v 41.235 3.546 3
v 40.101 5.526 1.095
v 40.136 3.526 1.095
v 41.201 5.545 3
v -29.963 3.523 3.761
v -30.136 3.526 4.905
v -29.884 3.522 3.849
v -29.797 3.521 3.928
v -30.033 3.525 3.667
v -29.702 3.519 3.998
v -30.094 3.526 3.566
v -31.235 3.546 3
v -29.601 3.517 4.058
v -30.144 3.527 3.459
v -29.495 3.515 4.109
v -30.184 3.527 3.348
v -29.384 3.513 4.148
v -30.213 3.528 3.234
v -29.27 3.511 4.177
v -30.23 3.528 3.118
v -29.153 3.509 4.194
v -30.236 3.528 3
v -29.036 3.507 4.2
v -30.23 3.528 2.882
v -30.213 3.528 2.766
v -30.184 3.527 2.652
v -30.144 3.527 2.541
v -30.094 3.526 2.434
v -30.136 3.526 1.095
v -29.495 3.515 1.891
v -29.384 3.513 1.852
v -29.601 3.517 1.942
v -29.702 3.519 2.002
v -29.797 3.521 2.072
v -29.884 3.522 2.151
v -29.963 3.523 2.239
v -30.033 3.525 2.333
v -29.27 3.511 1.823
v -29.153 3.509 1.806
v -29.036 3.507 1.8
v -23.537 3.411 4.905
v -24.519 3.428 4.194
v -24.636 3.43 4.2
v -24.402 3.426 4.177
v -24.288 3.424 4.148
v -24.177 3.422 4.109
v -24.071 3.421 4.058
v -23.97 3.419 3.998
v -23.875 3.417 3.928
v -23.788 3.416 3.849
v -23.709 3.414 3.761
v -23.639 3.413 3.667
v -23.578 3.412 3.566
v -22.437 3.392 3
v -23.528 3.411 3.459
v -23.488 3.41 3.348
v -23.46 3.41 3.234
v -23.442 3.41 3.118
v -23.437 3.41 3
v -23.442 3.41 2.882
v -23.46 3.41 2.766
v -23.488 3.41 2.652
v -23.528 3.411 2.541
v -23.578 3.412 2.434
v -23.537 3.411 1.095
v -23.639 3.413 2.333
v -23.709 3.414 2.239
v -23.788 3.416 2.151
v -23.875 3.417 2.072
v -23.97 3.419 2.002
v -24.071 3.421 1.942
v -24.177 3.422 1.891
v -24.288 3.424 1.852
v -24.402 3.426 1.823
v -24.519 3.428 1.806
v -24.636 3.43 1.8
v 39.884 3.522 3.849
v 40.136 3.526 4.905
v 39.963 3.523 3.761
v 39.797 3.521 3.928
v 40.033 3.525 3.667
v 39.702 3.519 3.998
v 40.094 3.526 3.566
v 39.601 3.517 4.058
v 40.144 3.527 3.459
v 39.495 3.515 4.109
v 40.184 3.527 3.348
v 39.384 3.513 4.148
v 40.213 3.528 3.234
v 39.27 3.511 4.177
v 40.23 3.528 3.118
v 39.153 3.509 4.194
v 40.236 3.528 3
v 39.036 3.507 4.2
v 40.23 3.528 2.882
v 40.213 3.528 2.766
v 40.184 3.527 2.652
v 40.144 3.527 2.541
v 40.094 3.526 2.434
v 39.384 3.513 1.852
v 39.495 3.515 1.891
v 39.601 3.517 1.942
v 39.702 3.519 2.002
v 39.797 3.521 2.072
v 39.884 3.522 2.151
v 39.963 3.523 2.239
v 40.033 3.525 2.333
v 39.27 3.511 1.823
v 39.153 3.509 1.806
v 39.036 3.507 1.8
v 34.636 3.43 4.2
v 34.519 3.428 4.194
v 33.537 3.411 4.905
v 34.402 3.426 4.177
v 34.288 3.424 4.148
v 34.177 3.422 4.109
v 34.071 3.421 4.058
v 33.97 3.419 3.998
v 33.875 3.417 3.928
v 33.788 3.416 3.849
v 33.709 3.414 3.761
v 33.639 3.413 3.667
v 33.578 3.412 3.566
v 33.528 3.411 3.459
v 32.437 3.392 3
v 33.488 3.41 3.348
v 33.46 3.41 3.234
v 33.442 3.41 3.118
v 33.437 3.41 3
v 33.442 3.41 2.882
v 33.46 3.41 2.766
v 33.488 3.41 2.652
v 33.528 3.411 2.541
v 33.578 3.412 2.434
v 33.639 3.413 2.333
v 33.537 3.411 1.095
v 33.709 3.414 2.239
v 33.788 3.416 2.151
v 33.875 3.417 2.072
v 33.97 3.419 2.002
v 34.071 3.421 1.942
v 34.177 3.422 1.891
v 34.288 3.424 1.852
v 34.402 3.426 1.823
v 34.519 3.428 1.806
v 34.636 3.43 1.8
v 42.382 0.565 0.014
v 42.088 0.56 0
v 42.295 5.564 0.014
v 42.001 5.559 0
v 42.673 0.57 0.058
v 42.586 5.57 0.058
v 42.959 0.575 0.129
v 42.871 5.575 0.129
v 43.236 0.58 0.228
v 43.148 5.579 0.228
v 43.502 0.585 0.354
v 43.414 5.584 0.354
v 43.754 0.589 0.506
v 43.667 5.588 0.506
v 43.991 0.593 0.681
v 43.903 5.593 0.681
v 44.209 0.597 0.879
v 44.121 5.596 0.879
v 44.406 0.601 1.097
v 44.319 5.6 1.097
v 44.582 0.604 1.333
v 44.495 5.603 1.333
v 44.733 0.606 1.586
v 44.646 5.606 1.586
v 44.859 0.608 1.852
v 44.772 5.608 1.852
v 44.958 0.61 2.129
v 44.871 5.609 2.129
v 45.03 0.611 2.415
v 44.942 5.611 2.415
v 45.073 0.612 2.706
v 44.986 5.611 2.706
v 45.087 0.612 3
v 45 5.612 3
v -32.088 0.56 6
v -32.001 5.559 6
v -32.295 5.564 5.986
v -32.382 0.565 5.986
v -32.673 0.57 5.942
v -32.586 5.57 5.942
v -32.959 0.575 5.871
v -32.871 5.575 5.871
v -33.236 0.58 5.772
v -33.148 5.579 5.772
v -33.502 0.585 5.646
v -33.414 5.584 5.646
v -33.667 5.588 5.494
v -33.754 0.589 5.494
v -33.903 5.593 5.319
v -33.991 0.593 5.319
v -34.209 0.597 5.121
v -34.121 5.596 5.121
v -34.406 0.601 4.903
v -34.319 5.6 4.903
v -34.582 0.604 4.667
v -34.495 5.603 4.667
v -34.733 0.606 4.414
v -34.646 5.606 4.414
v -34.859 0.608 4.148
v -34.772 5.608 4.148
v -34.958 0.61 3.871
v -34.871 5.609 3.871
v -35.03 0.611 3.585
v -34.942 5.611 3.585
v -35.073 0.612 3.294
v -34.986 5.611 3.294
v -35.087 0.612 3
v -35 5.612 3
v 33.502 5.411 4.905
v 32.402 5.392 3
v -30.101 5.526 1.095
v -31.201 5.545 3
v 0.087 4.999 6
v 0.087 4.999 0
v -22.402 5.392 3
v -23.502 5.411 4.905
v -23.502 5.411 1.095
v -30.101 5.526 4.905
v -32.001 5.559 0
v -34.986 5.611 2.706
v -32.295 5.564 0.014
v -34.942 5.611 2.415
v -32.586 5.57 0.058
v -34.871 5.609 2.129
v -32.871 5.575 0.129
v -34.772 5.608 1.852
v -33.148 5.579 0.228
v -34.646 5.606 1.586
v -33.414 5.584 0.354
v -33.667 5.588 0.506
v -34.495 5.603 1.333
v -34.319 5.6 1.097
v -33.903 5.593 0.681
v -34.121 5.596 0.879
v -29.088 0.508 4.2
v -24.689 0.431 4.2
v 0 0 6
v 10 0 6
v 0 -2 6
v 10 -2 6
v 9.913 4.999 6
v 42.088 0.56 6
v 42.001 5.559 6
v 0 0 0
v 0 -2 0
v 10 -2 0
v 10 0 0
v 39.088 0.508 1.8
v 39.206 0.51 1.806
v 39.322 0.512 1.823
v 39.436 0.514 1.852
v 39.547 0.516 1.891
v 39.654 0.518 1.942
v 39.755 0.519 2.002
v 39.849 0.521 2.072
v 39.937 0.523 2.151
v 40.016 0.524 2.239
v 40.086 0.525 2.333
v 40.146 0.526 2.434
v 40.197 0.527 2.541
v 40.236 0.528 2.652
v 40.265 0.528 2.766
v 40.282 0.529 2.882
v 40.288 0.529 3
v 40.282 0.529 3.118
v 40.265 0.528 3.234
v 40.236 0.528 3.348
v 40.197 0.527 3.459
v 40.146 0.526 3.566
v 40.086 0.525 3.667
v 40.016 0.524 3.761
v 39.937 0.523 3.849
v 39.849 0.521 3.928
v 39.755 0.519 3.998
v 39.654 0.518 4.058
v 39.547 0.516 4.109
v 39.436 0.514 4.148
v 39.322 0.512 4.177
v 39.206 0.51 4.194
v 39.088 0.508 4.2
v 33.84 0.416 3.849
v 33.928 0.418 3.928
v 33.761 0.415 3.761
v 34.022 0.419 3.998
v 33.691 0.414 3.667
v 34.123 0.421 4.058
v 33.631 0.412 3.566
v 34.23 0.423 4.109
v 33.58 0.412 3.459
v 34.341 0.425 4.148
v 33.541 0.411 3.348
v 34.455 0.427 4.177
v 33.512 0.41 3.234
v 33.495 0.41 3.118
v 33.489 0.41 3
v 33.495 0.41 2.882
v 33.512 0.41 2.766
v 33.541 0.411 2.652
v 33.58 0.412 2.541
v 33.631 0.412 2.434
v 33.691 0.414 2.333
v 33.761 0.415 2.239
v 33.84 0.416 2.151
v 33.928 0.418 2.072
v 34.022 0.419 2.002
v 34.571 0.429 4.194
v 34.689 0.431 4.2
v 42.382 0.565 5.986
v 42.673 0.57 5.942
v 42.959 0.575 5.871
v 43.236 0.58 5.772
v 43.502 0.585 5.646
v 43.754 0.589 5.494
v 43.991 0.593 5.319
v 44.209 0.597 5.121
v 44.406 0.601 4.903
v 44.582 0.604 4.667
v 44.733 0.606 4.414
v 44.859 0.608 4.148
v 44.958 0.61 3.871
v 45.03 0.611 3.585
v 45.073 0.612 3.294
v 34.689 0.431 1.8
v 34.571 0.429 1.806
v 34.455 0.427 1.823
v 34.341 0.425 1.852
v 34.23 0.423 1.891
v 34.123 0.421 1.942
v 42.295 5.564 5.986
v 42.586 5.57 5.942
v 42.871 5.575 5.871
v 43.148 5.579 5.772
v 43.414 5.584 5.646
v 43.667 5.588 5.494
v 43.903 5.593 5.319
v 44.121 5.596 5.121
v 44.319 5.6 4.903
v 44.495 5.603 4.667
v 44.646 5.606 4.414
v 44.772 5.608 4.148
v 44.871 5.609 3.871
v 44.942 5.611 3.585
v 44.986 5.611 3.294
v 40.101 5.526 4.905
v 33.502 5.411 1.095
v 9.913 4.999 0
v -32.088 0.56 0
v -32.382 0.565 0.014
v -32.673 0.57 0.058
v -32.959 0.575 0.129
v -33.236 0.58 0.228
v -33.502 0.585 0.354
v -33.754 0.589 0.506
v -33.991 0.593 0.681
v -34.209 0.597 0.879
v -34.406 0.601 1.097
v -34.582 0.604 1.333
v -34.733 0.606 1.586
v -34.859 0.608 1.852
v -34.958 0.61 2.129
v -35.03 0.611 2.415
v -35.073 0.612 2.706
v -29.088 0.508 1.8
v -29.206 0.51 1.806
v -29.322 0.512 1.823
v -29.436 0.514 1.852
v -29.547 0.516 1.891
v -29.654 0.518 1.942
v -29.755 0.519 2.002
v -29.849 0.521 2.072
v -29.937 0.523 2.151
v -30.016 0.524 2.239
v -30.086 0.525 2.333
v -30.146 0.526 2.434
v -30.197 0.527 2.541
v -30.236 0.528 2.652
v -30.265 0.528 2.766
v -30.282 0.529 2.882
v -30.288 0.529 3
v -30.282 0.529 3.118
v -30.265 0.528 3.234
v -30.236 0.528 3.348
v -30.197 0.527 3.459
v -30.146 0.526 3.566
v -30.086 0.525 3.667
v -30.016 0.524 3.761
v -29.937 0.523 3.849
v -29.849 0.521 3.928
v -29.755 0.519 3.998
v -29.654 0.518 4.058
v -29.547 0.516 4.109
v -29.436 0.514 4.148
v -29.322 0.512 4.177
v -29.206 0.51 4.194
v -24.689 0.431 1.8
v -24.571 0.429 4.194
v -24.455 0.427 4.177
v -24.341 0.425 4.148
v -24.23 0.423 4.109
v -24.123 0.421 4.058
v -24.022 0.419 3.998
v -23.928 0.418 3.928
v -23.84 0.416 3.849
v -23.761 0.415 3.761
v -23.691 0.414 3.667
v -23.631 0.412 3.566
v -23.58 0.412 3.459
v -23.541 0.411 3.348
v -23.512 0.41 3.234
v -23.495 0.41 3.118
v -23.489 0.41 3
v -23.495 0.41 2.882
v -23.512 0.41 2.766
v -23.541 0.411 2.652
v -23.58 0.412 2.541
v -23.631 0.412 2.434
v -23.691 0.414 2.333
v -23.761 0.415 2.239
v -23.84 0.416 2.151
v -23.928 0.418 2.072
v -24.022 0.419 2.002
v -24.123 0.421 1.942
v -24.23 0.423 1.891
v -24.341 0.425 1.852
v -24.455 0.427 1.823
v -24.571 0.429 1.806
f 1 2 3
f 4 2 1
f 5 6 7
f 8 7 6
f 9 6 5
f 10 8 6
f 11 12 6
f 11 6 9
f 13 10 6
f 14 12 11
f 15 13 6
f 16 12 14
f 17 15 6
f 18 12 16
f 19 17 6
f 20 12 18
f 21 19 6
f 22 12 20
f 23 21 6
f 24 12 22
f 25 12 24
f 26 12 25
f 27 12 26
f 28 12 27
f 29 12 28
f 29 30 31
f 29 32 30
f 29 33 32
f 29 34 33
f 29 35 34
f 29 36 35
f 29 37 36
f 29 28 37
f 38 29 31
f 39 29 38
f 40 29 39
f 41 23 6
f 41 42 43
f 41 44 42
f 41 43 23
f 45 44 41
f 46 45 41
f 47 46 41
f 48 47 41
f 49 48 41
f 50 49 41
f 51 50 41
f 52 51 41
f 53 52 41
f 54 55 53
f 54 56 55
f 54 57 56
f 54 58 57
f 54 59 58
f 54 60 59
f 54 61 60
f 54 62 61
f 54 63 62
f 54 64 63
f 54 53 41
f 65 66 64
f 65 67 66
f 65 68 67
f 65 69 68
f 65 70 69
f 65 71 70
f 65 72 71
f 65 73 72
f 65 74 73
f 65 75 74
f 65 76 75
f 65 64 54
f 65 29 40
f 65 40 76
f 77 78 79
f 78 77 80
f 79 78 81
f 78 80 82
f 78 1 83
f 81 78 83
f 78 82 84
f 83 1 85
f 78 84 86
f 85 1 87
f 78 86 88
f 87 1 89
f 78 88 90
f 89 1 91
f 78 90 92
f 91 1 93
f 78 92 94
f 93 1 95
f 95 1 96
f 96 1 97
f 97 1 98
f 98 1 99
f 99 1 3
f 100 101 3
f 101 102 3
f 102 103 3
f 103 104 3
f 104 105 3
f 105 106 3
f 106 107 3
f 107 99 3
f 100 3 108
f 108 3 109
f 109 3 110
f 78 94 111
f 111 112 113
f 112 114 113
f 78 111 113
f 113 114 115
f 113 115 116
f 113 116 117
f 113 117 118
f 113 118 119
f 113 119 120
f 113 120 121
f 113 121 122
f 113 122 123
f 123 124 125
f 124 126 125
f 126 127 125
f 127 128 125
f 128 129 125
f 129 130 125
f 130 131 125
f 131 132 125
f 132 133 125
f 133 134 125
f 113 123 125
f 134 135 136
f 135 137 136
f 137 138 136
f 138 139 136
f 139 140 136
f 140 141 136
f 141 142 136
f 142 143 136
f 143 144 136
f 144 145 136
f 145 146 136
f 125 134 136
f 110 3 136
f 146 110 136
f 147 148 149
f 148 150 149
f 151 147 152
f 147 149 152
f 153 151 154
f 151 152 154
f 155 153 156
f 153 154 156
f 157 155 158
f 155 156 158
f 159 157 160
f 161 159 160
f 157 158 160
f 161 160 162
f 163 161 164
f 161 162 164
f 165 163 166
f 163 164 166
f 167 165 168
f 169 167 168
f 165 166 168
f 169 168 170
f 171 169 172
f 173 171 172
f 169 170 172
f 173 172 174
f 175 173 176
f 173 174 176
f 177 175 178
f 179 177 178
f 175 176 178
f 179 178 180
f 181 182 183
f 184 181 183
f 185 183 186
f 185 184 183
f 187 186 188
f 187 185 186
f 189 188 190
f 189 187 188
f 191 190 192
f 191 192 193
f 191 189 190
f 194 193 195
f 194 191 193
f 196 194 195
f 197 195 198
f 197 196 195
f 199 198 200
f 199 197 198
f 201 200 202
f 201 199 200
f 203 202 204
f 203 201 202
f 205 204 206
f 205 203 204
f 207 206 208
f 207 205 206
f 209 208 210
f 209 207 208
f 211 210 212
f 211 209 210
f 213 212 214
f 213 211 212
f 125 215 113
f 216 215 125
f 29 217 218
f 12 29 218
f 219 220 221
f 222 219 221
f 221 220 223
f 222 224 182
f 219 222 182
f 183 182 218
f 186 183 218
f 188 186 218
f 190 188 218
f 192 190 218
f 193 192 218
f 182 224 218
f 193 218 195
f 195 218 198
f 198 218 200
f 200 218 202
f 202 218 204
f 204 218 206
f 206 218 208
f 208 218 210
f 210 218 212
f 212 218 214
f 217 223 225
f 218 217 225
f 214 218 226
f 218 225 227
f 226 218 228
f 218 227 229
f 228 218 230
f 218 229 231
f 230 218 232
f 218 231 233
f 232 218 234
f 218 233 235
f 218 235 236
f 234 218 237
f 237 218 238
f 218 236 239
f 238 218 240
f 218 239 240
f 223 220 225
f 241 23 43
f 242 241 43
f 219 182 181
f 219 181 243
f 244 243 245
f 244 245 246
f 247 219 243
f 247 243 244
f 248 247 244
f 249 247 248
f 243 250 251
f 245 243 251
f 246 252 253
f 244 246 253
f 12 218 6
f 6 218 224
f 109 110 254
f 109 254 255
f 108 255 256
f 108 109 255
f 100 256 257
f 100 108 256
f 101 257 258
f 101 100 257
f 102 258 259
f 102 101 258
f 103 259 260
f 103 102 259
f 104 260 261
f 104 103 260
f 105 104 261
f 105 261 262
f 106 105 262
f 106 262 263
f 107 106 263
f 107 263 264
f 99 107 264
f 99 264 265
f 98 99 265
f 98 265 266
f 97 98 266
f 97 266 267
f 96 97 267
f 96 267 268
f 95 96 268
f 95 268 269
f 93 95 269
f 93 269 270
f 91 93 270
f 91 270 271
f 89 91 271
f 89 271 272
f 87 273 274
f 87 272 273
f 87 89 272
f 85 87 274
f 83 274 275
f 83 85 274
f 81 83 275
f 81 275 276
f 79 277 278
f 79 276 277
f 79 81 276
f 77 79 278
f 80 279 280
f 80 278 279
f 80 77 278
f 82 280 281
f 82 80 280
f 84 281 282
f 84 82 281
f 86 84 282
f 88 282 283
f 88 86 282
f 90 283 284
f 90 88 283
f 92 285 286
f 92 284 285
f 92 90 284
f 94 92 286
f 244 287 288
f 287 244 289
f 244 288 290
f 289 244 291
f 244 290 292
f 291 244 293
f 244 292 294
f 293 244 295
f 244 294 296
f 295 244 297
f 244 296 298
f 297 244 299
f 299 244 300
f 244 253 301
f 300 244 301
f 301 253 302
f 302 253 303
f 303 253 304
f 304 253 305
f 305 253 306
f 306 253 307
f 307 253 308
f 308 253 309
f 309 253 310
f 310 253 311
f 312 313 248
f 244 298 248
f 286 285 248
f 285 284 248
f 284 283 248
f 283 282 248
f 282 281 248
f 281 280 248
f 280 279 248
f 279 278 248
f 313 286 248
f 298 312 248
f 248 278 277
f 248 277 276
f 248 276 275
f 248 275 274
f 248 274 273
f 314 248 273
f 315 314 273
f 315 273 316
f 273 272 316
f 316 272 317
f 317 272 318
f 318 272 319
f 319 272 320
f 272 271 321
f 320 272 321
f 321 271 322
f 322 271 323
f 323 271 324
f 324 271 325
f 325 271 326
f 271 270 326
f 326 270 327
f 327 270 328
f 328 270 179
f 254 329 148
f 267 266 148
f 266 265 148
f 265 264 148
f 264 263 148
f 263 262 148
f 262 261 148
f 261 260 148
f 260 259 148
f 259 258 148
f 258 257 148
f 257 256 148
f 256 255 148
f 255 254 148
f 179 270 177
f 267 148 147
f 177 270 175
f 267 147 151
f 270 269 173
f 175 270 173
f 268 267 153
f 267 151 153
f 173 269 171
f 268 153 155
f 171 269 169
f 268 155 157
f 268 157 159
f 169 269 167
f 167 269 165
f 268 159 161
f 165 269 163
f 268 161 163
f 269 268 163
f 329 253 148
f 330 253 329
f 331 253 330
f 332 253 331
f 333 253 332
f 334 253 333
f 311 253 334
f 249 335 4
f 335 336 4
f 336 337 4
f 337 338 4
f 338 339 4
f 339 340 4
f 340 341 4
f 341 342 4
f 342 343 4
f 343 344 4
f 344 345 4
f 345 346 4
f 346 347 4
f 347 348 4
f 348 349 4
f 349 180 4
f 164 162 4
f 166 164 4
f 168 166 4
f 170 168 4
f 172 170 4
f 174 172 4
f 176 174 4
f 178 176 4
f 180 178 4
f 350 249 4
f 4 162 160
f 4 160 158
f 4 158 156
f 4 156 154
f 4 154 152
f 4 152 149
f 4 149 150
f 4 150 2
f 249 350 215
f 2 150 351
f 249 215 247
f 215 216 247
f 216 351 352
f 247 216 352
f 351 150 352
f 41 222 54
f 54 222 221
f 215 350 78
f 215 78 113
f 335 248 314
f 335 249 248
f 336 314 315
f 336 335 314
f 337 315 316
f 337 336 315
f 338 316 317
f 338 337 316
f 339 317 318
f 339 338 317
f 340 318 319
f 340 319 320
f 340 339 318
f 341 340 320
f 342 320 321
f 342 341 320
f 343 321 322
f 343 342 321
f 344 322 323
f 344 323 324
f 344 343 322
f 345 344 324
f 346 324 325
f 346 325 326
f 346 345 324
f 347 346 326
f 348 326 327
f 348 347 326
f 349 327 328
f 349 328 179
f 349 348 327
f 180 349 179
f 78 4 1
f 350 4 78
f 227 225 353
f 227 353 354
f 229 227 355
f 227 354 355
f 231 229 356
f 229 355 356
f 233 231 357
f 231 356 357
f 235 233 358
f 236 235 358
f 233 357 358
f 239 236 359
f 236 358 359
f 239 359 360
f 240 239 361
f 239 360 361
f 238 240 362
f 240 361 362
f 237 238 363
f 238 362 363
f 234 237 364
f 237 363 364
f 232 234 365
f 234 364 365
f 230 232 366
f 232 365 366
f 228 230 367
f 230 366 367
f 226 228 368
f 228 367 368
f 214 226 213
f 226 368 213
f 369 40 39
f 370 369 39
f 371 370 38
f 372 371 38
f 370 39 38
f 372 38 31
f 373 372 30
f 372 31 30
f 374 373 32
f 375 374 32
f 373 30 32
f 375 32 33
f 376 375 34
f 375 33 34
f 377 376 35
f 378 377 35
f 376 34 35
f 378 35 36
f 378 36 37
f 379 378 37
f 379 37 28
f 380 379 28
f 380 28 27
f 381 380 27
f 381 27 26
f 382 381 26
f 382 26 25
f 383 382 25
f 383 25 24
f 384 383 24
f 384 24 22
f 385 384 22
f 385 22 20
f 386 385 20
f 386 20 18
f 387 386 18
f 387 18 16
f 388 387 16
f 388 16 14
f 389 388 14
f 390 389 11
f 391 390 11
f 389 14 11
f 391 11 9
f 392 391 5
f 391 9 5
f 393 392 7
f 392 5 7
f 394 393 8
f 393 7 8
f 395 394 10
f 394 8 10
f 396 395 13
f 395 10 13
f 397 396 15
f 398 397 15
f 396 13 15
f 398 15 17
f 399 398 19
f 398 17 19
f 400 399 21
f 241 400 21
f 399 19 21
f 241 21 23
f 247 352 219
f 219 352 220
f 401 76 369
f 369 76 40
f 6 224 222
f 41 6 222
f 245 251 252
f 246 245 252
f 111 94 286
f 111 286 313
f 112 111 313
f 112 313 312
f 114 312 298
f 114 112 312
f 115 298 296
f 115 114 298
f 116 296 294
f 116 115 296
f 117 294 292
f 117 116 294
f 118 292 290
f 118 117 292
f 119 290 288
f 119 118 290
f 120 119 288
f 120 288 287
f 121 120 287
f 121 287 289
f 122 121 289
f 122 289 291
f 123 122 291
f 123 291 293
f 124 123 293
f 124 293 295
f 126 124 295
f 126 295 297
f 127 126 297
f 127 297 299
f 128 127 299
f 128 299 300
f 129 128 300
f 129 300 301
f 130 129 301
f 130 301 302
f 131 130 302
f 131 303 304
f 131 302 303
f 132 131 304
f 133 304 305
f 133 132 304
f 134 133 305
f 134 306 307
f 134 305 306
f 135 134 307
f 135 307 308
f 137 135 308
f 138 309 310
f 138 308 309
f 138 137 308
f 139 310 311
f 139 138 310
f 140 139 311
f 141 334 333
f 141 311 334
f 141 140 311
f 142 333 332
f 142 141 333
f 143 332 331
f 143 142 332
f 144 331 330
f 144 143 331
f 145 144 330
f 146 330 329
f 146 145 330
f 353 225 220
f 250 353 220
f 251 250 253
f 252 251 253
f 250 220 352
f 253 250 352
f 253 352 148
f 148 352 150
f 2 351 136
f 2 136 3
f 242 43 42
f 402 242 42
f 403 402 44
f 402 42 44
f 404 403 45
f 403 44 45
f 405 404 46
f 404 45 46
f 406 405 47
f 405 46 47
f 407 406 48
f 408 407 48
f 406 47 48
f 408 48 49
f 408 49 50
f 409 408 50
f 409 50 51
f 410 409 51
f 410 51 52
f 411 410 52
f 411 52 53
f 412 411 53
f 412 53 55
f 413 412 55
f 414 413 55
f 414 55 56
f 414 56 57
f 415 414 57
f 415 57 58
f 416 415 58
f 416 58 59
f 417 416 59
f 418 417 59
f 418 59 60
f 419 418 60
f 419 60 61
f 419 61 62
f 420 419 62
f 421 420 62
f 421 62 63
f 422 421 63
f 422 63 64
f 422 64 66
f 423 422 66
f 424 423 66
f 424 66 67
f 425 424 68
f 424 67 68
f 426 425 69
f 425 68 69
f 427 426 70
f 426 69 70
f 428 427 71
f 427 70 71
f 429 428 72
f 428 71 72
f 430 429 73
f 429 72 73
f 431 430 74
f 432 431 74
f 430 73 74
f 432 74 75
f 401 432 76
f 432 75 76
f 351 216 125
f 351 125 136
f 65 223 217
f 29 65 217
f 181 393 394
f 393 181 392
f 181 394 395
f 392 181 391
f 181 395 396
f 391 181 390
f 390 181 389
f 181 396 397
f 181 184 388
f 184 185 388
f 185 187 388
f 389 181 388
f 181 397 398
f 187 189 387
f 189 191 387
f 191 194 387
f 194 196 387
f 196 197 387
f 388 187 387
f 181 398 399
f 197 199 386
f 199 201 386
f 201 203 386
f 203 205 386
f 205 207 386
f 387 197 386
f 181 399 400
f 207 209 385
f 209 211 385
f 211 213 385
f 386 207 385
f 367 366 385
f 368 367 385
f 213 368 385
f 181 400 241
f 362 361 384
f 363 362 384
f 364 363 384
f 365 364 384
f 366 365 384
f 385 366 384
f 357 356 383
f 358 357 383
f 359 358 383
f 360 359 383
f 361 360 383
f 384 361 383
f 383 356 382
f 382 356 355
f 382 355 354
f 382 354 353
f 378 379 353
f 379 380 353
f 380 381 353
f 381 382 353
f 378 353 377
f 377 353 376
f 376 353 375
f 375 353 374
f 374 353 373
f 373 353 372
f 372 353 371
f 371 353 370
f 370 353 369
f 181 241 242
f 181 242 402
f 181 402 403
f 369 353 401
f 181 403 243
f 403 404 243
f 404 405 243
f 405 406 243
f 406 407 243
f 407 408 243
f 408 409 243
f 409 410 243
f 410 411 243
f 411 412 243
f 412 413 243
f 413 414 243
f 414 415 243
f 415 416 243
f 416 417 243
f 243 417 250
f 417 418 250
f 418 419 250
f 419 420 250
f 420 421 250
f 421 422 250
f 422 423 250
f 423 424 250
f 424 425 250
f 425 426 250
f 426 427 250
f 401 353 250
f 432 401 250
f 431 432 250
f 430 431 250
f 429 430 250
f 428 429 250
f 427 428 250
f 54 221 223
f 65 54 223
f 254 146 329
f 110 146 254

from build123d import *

# Parameters (mm, degrees)
BOSS_EXTRUDE1_DEPTH = 6
CUT_EXTRUDE1_DEPTH  = 6
CUT_EXTRUDE3_DEPTH  = 2
FILLET1_R           = 3


with BuildPart() as part:
    # Sketch1 → Boss-Extrude1 (new body)
    with BuildSketch(Plane.XY):
        Polygon((10, 0), (45.087262032, 0.612450437), (45, 5.611688913), (9.912737968, 4.999238476), (0.087262032, 4.999238476), (-35, 5.611688913), (-35.087262032, 0.612450437), (0, 0), (0, -2), (10, -2), align=None)
    extrude(amount=BOSS_EXTRUDE1_DEPTH)

    # Sketch2 → Cut-Extrude1 (cut)
    with BuildSketch(Plane(origin=(0.087262032, 4.999238476, 0), x_dir=(0.9998476951563913, -0.017452406437283737, 0), z_dir=(0.017452406437283737, 0.9998476951563913, 0))):
        with BuildLine():
            Line((-29.092606806, -4.2), (-24.692606806, -4.2))
            ThreePointArc((-24.692606806, -4.2), (-23.492606806, -3), (-24.692606806, -1.8))
            Line((-24.692606806, -1.8), (-29.092606806, -1.8))
            ThreePointArc((-29.092606806, -1.8), (-30.292606806, -3), (-29.092606806, -4.2))
        make_face()
    cut_extrude1 = extrude(amount=-CUT_EXTRUDE1_DEPTH, mode=Mode.SUBTRACT)

    # Sketch2<3> → Cut-Extrude3 (cut)
    with BuildSketch(Plane(origin=(0.087262032, 4.999238476, 0), x_dir=(0.9998476951563913, -0.017452406437283737, 0), z_dir=(0.017452406437283737, 0.9998476951563913, 0))):
        Polygon((-22.492606806, -3), (-23.592606806, -1.094744112), (-30.192606806, -1.094744112), (-31.292606806, -3), (-30.192606806, -4.905255888), (-23.592606806, -4.905255888), align=None)
        with BuildLine():
            ThreePointArc((-24.692606806, -4.2), (-23.492606806, -3), (-24.692606806, -1.8))
            Line((-24.692606806, -1.8), (-29.092606806, -1.8))
            ThreePointArc((-29.092606806, -1.8), (-30.292606806, -3), (-29.092606806, -4.2))
            Line((-29.092606806, -4.2), (-24.692606806, -4.2))
        make_face(mode=Mode.SUBTRACT)
    cut_extrude3 = extrude(amount=-CUT_EXTRUDE3_DEPTH, mode=Mode.SUBTRACT)

    # Mirror1: Cut-Extrude1, Cut-Extrude3 across plane
    add(cut_extrude1.mirror(Plane(origin=(5, 0, 0), x_dir=(0, 0, 1), z_dir=(1, 0, 0))), mode=Mode.SUBTRACT)
    add(cut_extrude3.mirror(Plane(origin=(5, 0, 0), x_dir=(0, 0, 1), z_dir=(1, 0, 0))), mode=Mode.SUBTRACT)

    # Fillet1
    fillet1_edges = [part.edges().sort_by_distance(p)[0] for p in [
        (45.043631016, 3.112069675, 0),
        (45.043631016, 3.112069675, 6),
        (-35.043631016, 3.112069675, 0),
        (-35.043631016, 3.112069675, 6),
    ]]
    fillet(fillet1_edges, radius=FILLET1_R - 0.0001)  # a hair under: the kernel refuses the full size


solid = part.part
